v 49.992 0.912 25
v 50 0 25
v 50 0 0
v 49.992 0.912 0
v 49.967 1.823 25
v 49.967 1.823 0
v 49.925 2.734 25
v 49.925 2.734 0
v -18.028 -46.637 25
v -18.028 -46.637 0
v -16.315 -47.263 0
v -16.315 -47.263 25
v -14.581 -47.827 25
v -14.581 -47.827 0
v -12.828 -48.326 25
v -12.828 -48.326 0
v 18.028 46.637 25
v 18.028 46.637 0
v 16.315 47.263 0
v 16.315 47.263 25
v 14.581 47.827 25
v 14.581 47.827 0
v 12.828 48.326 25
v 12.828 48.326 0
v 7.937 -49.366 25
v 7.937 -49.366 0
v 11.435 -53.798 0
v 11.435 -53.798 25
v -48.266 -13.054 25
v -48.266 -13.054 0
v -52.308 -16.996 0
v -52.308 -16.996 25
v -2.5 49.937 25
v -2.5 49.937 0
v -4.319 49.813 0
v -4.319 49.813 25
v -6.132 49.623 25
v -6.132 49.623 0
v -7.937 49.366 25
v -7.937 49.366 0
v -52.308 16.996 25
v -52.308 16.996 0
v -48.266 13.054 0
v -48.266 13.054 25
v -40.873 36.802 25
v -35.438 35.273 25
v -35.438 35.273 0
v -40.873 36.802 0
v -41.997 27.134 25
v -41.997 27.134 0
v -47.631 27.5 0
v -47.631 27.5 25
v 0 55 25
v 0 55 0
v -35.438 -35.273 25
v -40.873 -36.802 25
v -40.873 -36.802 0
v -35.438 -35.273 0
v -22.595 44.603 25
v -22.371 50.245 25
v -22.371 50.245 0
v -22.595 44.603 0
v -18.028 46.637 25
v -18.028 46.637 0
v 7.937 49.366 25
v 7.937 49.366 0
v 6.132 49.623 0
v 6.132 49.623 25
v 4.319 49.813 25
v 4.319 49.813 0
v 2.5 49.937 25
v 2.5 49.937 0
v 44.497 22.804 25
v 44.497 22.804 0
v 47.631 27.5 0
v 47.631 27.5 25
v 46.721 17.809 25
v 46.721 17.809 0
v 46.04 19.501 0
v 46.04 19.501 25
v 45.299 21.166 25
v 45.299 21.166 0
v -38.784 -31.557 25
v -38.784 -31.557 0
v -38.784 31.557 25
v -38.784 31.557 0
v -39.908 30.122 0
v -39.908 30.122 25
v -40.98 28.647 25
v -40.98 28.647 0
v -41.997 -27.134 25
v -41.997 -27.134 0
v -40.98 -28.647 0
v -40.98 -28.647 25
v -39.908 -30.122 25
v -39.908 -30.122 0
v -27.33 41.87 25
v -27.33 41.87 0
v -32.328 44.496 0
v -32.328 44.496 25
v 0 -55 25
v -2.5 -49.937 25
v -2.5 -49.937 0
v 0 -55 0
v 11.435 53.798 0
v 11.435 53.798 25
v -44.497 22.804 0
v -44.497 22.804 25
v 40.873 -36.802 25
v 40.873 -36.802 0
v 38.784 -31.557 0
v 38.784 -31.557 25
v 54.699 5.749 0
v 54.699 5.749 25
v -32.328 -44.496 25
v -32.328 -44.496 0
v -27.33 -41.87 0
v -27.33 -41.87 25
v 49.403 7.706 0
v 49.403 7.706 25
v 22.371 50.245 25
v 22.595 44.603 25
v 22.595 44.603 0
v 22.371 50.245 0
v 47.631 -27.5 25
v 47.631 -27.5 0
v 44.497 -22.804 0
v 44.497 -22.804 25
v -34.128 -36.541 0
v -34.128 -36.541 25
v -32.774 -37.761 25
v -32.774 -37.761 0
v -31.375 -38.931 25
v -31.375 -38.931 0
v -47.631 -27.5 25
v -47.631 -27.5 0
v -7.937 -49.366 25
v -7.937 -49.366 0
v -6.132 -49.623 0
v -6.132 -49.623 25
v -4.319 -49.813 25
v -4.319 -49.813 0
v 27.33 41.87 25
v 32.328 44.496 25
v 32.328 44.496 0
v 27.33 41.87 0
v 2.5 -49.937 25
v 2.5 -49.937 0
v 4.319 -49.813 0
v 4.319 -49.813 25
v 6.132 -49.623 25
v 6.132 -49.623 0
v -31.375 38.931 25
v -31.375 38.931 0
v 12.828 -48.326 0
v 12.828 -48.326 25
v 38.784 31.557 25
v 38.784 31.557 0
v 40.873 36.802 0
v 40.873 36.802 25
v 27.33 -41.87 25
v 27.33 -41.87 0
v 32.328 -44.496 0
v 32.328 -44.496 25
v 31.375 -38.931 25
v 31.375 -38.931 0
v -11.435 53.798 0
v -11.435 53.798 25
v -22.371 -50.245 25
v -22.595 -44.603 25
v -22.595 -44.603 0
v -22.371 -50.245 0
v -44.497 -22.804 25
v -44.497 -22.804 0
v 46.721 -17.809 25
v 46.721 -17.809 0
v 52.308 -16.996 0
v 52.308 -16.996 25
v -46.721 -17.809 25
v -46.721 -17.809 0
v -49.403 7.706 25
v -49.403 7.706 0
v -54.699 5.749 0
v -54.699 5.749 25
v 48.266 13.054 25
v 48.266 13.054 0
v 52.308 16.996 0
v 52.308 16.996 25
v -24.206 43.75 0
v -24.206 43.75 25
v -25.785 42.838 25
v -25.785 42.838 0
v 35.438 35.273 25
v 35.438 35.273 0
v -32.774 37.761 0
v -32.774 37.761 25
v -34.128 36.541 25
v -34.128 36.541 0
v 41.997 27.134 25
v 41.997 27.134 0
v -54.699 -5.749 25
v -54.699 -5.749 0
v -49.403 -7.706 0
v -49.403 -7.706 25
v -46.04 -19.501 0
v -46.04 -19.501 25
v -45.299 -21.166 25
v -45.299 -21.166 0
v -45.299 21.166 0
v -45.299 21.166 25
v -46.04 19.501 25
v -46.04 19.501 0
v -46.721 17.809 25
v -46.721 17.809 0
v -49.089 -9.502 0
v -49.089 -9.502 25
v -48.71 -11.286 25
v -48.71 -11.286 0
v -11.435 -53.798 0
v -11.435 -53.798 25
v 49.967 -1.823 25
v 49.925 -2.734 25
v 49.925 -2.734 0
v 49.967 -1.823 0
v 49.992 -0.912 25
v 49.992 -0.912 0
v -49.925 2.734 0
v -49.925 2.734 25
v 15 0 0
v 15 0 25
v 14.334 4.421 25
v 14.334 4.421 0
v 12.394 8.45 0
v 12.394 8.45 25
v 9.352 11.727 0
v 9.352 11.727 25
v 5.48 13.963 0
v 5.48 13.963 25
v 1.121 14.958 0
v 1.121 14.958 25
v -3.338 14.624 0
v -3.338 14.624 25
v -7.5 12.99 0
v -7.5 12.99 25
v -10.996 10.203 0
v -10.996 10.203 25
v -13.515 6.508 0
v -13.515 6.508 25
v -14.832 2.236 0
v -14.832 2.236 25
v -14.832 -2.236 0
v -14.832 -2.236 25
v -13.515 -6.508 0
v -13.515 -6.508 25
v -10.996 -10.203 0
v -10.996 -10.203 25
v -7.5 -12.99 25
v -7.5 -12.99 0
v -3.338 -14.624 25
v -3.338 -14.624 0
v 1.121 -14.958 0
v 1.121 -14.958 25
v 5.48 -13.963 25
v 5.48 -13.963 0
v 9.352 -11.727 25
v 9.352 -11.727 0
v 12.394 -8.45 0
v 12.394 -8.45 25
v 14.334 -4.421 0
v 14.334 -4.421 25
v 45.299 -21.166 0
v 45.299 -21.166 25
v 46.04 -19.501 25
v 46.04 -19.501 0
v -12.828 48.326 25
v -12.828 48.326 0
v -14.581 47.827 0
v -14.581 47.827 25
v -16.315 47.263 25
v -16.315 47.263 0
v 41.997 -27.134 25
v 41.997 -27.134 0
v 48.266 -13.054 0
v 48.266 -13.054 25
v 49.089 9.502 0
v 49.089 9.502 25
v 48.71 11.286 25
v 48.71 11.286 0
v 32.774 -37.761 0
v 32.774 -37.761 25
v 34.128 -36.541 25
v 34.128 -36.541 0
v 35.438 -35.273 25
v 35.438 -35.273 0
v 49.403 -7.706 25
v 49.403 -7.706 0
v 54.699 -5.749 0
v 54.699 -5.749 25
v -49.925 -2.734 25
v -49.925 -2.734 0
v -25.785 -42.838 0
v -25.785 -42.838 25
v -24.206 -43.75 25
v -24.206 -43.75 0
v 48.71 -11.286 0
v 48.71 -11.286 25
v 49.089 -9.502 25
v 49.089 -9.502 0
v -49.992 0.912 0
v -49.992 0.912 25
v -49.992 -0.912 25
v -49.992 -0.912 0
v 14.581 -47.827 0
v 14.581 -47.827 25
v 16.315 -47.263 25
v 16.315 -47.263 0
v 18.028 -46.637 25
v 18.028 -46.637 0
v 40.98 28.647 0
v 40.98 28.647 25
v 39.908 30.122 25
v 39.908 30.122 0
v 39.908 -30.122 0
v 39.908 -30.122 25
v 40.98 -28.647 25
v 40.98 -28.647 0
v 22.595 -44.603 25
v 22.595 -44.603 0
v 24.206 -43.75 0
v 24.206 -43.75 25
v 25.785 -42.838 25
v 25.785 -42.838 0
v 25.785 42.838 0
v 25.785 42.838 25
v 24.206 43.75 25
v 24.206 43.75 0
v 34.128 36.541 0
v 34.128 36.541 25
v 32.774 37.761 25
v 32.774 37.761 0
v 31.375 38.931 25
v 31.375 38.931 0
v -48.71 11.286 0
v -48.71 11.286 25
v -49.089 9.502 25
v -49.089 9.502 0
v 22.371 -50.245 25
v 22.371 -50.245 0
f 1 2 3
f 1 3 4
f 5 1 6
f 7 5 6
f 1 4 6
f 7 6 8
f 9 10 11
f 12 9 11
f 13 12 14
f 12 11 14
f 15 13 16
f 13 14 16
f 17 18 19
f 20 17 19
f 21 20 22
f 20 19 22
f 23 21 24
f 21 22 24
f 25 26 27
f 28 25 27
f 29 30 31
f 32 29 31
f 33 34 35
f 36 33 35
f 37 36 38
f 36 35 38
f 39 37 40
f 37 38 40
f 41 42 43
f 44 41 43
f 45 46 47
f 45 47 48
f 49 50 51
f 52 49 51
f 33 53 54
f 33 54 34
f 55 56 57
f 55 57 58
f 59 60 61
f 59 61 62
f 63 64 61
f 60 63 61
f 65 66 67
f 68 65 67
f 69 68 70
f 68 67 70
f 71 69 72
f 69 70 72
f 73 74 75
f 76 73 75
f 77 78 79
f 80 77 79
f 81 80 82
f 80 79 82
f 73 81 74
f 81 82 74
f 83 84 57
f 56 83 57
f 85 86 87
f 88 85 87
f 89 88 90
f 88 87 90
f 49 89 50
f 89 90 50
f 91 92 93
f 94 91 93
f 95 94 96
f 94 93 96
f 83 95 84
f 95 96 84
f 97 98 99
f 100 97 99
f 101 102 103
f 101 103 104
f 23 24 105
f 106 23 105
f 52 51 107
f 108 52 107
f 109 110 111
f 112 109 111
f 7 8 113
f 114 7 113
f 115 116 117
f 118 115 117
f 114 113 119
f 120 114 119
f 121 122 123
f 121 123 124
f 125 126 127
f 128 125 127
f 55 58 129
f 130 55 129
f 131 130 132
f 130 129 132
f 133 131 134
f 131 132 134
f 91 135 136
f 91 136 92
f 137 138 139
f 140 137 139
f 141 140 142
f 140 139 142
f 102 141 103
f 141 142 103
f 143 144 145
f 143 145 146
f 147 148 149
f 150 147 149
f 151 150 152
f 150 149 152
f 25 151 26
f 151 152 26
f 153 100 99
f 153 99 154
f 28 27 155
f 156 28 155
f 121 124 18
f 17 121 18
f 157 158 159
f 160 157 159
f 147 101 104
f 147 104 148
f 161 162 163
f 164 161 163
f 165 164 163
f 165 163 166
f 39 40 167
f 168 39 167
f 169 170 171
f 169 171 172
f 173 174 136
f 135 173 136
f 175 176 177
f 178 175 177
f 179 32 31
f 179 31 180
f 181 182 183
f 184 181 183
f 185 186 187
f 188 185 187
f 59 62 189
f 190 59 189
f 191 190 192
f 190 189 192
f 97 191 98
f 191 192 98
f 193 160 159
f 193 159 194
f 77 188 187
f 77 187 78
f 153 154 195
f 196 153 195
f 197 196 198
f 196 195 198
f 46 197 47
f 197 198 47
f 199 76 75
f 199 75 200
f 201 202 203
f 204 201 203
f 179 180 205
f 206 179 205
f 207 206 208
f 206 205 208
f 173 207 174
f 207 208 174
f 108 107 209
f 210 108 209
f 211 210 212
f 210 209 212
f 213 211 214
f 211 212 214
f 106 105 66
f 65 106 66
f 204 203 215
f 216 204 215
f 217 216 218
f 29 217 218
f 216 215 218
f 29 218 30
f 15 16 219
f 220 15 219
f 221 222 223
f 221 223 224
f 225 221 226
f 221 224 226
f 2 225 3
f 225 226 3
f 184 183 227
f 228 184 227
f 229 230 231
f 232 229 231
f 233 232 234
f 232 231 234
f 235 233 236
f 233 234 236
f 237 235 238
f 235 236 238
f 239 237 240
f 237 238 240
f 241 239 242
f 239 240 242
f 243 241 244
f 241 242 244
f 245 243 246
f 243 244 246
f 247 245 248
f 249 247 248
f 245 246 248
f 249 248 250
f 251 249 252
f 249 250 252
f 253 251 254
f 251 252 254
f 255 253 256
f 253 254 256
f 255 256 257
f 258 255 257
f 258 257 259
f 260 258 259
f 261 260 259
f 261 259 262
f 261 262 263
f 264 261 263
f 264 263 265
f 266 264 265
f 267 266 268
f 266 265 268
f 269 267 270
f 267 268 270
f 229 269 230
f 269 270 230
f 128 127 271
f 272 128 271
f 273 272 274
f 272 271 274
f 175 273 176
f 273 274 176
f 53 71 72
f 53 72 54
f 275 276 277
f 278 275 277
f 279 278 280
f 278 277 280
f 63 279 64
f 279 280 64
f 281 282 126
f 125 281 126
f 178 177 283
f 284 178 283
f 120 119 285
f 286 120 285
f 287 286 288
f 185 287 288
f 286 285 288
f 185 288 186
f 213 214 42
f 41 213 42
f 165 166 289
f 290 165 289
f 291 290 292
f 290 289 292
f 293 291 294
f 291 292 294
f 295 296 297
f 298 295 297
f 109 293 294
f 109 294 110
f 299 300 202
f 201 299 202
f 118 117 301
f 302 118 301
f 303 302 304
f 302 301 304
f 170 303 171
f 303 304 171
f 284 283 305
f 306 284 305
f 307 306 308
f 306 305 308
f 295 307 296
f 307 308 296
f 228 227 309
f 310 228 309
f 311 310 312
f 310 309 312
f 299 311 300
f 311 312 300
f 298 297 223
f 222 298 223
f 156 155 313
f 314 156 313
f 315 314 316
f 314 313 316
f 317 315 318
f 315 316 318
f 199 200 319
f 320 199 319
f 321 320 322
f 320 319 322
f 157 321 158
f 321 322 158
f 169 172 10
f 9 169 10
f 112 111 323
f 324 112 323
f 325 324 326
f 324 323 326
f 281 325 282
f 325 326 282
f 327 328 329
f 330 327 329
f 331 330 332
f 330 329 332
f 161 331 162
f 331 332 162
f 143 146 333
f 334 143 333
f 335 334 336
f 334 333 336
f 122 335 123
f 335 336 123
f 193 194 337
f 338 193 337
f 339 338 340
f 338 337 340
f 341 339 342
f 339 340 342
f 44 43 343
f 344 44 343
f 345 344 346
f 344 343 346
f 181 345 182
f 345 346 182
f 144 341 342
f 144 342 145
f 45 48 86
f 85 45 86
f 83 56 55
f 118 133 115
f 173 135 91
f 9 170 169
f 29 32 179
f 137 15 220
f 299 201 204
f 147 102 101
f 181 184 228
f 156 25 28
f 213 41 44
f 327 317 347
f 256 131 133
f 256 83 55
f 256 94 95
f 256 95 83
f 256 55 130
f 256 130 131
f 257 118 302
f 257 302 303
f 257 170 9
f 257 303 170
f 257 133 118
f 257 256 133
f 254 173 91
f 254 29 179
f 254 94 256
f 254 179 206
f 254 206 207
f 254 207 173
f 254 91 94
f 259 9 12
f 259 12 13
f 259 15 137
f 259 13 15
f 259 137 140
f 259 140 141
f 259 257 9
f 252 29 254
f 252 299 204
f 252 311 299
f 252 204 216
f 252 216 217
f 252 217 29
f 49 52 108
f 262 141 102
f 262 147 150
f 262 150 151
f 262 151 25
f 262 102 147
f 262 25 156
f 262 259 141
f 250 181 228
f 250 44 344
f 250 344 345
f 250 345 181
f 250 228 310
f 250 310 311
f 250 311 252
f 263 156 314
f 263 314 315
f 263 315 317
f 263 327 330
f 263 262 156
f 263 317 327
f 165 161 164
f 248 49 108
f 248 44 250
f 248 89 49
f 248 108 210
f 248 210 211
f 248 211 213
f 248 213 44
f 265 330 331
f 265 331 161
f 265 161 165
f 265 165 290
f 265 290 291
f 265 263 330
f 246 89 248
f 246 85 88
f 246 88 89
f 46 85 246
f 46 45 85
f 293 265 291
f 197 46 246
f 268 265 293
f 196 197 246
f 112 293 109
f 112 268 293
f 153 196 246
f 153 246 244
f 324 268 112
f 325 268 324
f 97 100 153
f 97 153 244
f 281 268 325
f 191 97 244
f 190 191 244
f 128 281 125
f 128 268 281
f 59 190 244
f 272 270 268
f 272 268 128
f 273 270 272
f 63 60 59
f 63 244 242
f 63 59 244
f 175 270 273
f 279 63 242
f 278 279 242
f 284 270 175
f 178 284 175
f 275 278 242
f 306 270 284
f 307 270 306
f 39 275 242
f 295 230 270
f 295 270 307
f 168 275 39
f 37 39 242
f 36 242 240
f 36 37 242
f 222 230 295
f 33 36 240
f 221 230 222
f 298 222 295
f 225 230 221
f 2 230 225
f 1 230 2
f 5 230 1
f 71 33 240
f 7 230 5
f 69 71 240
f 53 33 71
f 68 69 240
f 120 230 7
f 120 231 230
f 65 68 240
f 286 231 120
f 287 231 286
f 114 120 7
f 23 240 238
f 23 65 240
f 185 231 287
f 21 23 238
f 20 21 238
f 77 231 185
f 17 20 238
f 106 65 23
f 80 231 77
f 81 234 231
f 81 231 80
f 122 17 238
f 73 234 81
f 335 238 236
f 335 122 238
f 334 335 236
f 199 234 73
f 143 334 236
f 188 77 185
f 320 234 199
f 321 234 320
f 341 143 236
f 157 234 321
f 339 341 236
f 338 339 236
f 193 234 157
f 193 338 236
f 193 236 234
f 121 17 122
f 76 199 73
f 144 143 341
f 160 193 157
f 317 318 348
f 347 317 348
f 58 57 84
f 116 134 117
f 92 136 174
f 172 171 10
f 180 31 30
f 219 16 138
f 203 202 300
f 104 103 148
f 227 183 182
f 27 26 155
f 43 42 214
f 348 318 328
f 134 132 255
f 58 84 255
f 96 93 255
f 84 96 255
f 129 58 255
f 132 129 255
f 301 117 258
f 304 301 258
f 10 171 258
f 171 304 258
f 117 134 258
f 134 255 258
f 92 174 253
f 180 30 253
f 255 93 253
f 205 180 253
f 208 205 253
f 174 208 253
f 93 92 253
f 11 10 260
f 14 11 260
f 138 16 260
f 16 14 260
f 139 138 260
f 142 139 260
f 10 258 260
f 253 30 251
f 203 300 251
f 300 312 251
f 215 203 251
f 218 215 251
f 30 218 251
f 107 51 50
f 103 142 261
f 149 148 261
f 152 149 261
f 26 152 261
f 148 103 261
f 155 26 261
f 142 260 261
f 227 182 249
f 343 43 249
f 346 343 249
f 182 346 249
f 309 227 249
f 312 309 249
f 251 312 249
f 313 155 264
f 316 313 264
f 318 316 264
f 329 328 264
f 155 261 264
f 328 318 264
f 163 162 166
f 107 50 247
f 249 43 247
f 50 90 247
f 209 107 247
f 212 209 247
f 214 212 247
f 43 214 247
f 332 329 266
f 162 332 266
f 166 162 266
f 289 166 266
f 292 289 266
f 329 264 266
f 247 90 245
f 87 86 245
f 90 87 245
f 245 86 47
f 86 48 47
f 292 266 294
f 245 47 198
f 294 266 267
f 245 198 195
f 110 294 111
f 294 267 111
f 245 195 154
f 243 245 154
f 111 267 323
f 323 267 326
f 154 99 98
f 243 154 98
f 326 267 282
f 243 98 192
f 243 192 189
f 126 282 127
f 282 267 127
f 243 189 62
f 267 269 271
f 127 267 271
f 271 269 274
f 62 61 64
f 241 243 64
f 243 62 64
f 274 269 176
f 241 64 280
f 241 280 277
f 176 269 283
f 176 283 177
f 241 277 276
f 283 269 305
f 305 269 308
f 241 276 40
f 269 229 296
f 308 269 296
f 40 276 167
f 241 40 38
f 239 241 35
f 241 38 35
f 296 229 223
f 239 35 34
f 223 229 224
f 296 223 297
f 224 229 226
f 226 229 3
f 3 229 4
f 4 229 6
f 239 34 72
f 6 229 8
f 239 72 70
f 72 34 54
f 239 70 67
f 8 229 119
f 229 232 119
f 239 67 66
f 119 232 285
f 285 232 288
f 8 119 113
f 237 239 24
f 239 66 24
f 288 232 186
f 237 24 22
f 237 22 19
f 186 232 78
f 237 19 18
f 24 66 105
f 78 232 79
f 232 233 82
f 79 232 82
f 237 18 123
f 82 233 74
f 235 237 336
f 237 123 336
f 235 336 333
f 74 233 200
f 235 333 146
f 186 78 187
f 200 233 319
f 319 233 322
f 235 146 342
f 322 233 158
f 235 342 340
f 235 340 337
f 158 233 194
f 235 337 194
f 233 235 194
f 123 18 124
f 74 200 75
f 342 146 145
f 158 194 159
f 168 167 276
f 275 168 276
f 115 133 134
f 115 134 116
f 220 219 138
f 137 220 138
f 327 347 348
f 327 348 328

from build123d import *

# Parameters (mm, degrees)
F1_DEPTH = 25
F2_R     = 15
F3_DEPTH = 25


with BuildPart() as f1:
    # F0 (on Top) → F1 (new body)
    with BuildSketch(Plane.XY):
        with BuildLine():
            ThreePointArc((49.925219, -2.733581), (49.981301, -1.367302), (50, 0))
            ThreePointArc((50, 0), (49.981301, 1.367302), (49.925219, 2.733581))
            ThreePointArc((49.925219, 2.733581), (49.726095, 5.226423), (49.402577, 7.706191))
            ThreePointArc((49.402577, 7.706191), (48.90738, 10.395585), (48.26589, 13.053883))
            ThreePointArc((48.26589, 13.053883), (47.552826, 15.45085), (46.720805, 17.809165))
            ThreePointArc((46.720805, 17.809165), (45.677273, 20.336832), (44.49711, 22.803667))
            ThreePointArc((44.49711, 22.803667), (43.30127, 25), (41.99711, 27.133794))
            ThreePointArc((41.99711, 27.133794), (40.45085, 29.389263), (38.783592, 31.556821))
            ThreePointArc((38.783592, 31.556821), (37.157241, 33.45653), (35.437939, 35.272546))
            ThreePointArc((35.437939, 35.272546), (33.45653, 37.157241), (31.375046, 38.930791))
            ThreePointArc((31.375046, 38.930791), (29.389263, 40.45085), (27.329961, 41.869718))
            ThreePointArc((27.329961, 41.869718), (25, 43.30127), (22.595259, 44.603299))
            ThreePointArc((22.595259, 44.603299), (20.336832, 45.677273), (18.027532, 46.636982))
            ThreePointArc((18.027532, 46.636982), (15.45085, 47.552826), (12.827951, 48.326428))
            ThreePointArc((12.827951, 48.326428), (10.395585, 48.90738), (7.937213, 49.365987))
            ThreePointArc((7.937213, 49.365987), (5.226423, 49.726095), (2.5, 49.937461))
            ThreePointArc((2.5, 49.937461), (0, 50), (-2.5, 49.937461))
            ThreePointArc((-2.5, 49.937461), (-5.226423, 49.726095), (-7.937213, 49.365987))
            ThreePointArc((-7.937213, 49.365987), (-10.395585, 48.90738), (-12.827951, 48.326428))
            ThreePointArc((-12.827951, 48.326428), (-15.45085, 47.552826), (-18.027532, 46.636982))
            ThreePointArc((-18.027532, 46.636982), (-20.336832, 45.677273), (-22.595259, 44.603299))
            ThreePointArc((-22.595259, 44.603299), (-25, 43.30127), (-27.329961, 41.869718))
            ThreePointArc((-27.329961, 41.869718), (-29.389263, 40.45085), (-31.375046, 38.930791))
            ThreePointArc((-31.375046, 38.930791), (-33.45653, 37.157241), (-35.437939, 35.272546))
            ThreePointArc((-35.437939, 35.272546), (-37.157241, 33.45653), (-38.783592, 31.556821))
            ThreePointArc((-38.783592, 31.556821), (-40.45085, 29.389263), (-41.99711, 27.133794))
            ThreePointArc((-41.99711, 27.133794), (-43.30127, 25), (-44.49711, 22.803667))
            ThreePointArc((-44.49711, 22.803667), (-45.677273, 20.336832), (-46.720805, 17.809165))
            ThreePointArc((-46.720805, 17.809165), (-47.552826, 15.45085), (-48.26589, 13.053883))
            ThreePointArc((-48.26589, 13.053883), (-48.90738, 10.395585), (-49.402577, 7.706191))
            ThreePointArc((-49.402577, 7.706191), (-49.726095, 5.226423), (-49.925219, 2.733581))
            ThreePointArc((-49.925219, 2.733581), (-50, 0), (-49.925219, -2.733581))
            ThreePointArc((-49.925219, -2.733581), (-49.726095, -5.226423), (-49.402577, -7.706191))
            ThreePointArc((-49.402577, -7.706191), (-48.90738, -10.395585), (-48.26589, -13.053883))
            ThreePointArc((-48.26589, -13.053883), (-47.552826, -15.45085), (-46.720805, -17.809165))
            ThreePointArc((-46.720805, -17.809165), (-45.677273, -20.336832), (-44.49711, -22.803667))
            ThreePointArc((-44.49711, -22.803667), (-43.30127, -25), (-41.99711, -27.133794))
            ThreePointArc((-41.99711, -27.133794), (-40.45085, -29.389263), (-38.783592, -31.556821))
            ThreePointArc((-38.783592, -31.556821), (-37.157241, -33.45653), (-35.437939, -35.272546))
            ThreePointArc((-35.437939, -35.272546), (-33.45653, -37.157241), (-31.375046, -38.930791))
            ThreePointArc((-31.375046, -38.930791), (-29.389263, -40.45085), (-27.329961, -41.869718))
            ThreePointArc((-27.329961, -41.869718), (-25, -43.30127), (-22.595259, -44.603299))
            ThreePointArc((-22.595259, -44.603299), (-20.336832, -45.677273), (-18.027532, -46.636982))
            ThreePointArc((-18.027532, -46.636982), (-15.45085, -47.552826), (-12.827951, -48.326428))
            ThreePointArc((-12.827951, -48.326428), (-10.395585, -48.90738), (-7.937213, -49.365987))
            ThreePointArc((-7.937213, -49.365987), (-5.226423, -49.726095), (-2.5, -49.937461))
            ThreePointArc((-2.5, -49.937461), (0, -50), (2.5, -49.937461))
            ThreePointArc((2.5, -49.937461), (5.226423, -49.726095), (7.937213, -49.365987))
            ThreePointArc((7.937213, -49.365987), (10.395585, -48.90738), (12.827951, -48.326428))
            ThreePointArc((12.827951, -48.326428), (15.45085, -47.552826), (18.027532, -46.636982))
            ThreePointArc((18.027532, -46.636982), (20.336832, -45.677273), (22.595259, -44.603299))
            ThreePointArc((22.595259, -44.603299), (25, -43.30127), (27.329961, -41.869718))
            ThreePointArc((27.329961, -41.869718), (29.389263, -40.45085), (31.375046, -38.930791))
            ThreePointArc((31.375046, -38.930791), (33.45653, -37.157241), (35.437939, -35.272546))
            ThreePointArc((35.437939, -35.272546), (37.157241, -33.45653), (38.783592, -31.556821))
            ThreePointArc((38.783592, -31.556821), (40.45085, -29.389263), (41.99711, -27.133794))
            ThreePointArc((41.99711, -27.133794), (43.30127, -25), (44.49711, -22.803667))
            ThreePointArc((44.49711, -22.803667), (45.677273, -20.336832), (46.720805, -17.809165))
            ThreePointArc((46.720805, -17.809165), (47.552826, -15.45085), (48.26589, -13.053883))
            ThreePointArc((48.26589, -13.053883), (48.90738, -10.395585), (49.402577, -7.706191))
            ThreePointArc((49.402577, -7.706191), (49.726095, -5.226423), (49.925219, -2.733581))
        make_face()
        with BuildLine():
            ThreePointArc((49.402577, 7.706191), (49.726095, 5.226423), (49.925219, 2.733581))
            Line((49.925219, 2.733581), (54.698704, 5.749065))
            Line((54.698704, 5.749065), (49.402577, 7.706191))
        make_face()
        with BuildLine():
            Line((54.698704, -5.749065), (49.925219, -2.733581))
            ThreePointArc((49.925219, -2.733581), (49.726095, -5.226423), (49.402577, -7.706191))
            Line((49.402577, -7.706191), (54.698704, -5.749065))
        make_face()
        with BuildLine():
            ThreePointArc((46.720805, 17.809165), (47.552826, 15.45085), (48.26589, 13.053883))
            Line((48.26589, 13.053883), (52.308108, 16.995935))
            Line((52.308108, 16.995935), (46.720805, 17.809165))
        make_face()
        with BuildLine():
            Line((52.308108, -16.995935), (48.26589, -13.053883))
            ThreePointArc((48.26589, -13.053883), (47.552826, -15.45085), (46.720805, -17.809165))
            Line((46.720805, -17.809165), (52.308108, -16.995935))
        make_face()
        with BuildLine():
            ThreePointArc((41.99711, 27.133794), (43.30127, 25), (44.49711, 22.803667))
            Line((44.49711, 22.803667), (47.631397, 27.5))
            Line((47.631397, 27.5), (41.99711, 27.133794))
        make_face()
        with BuildLine():
            Line((47.631397, -27.5), (44.49711, -22.803667))
            ThreePointArc((44.49711, -22.803667), (43.30127, -25), (41.99711, -27.133794))
            Line((41.99711, -27.133794), (47.631397, -27.5))
        make_face()
        with BuildLine():
            ThreePointArc((35.437939, 35.272546), (37.157241, 33.45653), (38.783592, 31.556821))
            Line((38.783592, 31.556821), (40.872965, 36.802183))
            Line((40.872965, 36.802183), (35.437939, 35.272546))
        make_face()
        with BuildLine():
            Line((40.872965, -36.802183), (38.783592, -31.556821))
            ThreePointArc((38.783592, -31.556821), (37.157241, -33.45653), (35.437939, -35.272546))
            Line((35.437939, -35.272546), (40.872965, -36.802183))
        make_face()
        with BuildLine():
            ThreePointArc((27.329961, 41.869718), (29.389263, 40.45085), (31.375046, 38.930791))
            Line((31.375046, 38.930791), (32.328189, 44.495935))
            Line((32.328189, 44.495935), (27.329961, 41.869718))
        make_face()
        with BuildLine():
            Line((32.328189, -44.495935), (31.375046, -38.930791))
            ThreePointArc((31.375046, -38.930791), (29.389263, -40.45085), (27.329961, -41.869718))
            Line((27.329961, -41.869718), (32.328189, -44.495935))
        make_face()
        with BuildLine():
            ThreePointArc((18.027532, 46.636982), (20.336832, 45.677273), (22.595259, 44.603299))
            Line((22.595259, 44.603299), (22.370515, 50.245))
            Line((22.370515, 50.245), (18.027532, 46.636982))
        make_face()
        with BuildLine():
            Line((22.370515, -50.245), (22.595259, -44.603299))
            ThreePointArc((22.595259, -44.603299), (20.336832, -45.677273), (18.027532, -46.636982))
            Line((18.027532, -46.636982), (22.370515, -50.245))
        make_face()
        with BuildLine():
            ThreePointArc((7.937213, 49.365987), (10.395585, 48.90738), (12.827951, 48.326428))
            Line((12.827951, 48.326428), (11.435143, 53.798118))
            Line((11.435143, 53.798118), (7.937213, 49.365987))
        make_face()
        with BuildLine():
            Line((11.435143, -53.798118), (12.827951, -48.326428))
            ThreePointArc((12.827951, -48.326428), (10.395585, -48.90738), (7.937213, -49.365987))
            Line((7.937213, -49.365987), (11.435143, -53.798118))
        make_face()
        with BuildLine():
            ThreePointArc((-2.5, 49.937461), (0, 50), (2.5, 49.937461))
            Line((2.5, 49.937461), (0, 55))
            Line((0, 55), (-2.5, 49.937461))
        make_face()
        with BuildLine():
            Line((0, -55), (2.5, -49.937461))
            ThreePointArc((2.5, -49.937461), (0, -50), (-2.5, -49.937461))
            Line((-2.5, -49.937461), (0, -55))
        make_face()
        with BuildLine():
            ThreePointArc((-12.827951, 48.326428), (-10.395585, 48.90738), (-7.937213, 49.365987))
            Line((-7.937213, 49.365987), (-11.435143, 53.798118))
            Line((-11.435143, 53.798118), (-12.827951, 48.326428))
        make_face()
        with BuildLine():
            Line((-11.435143, -53.798118), (-7.937213, -49.365987))
            ThreePointArc((-7.937213, -49.365987), (-10.395585, -48.90738), (-12.827951, -48.326428))
            Line((-12.827951, -48.326428), (-11.435143, -53.798118))
        make_face()
        with BuildLine():
            ThreePointArc((-22.595259, 44.603299), (-20.336832, 45.677273), (-18.027532, 46.636982))
            Line((-18.027532, 46.636982), (-22.370515, 50.245))
            Line((-22.370515, 50.245), (-22.595259, 44.603299))
        make_face()
        with BuildLine():
            Line((-22.370515, -50.245), (-18.027532, -46.636982))
            ThreePointArc((-18.027532, -46.636982), (-20.336832, -45.677273), (-22.595259, -44.603299))
            Line((-22.595259, -44.603299), (-22.370515, -50.245))
        make_face()
        with BuildLine():
            ThreePointArc((-31.375046, 38.930791), (-29.389263, 40.45085), (-27.329961, 41.869718))
            Line((-27.329961, 41.869718), (-32.328189, 44.495935))
            Line((-32.328189, 44.495935), (-31.375046, 38.930791))
        make_face()
        with BuildLine():
            Line((-32.328189, -44.495935), (-27.329961, -41.869718))
            ThreePointArc((-27.329961, -41.869718), (-29.389263, -40.45085), (-31.375046, -38.930791))
            Line((-31.375046, -38.930791), (-32.328189, -44.495935))
        make_face()
        with BuildLine():
            ThreePointArc((-38.783592, 31.556821), (-37.157241, 33.45653), (-35.437939, 35.272546))
            Line((-35.437939, 35.272546), (-40.872965, 36.802183))
            Line((-40.872965, 36.802183), (-38.783592, 31.556821))
        make_face()
        with BuildLine():
            Line((-40.872965, -36.802183), (-35.437939, -35.272546))
            ThreePointArc((-35.437939, -35.272546), (-37.157241, -33.45653), (-38.783592, -31.556821))
            Line((-38.783592, -31.556821), (-40.872965, -36.802183))
        make_face()
        with BuildLine():
            ThreePointArc((-44.49711, 22.803667), (-43.30127, 25), (-41.99711, 27.133794))
            Line((-41.99711, 27.133794), (-47.631397, 27.5))
            Line((-47.631397, 27.5), (-44.49711, 22.803667))
        make_face()
        with BuildLine():
            Line((-47.631397, -27.5), (-41.99711, -27.133794))
            ThreePointArc((-41.99711, -27.133794), (-43.30127, -25), (-44.49711, -22.803667))
            Line((-44.49711, -22.803667), (-47.631397, -27.5))
        make_face()
        with BuildLine():
            ThreePointArc((-48.26589, 13.053883), (-47.552826, 15.45085), (-46.720805, 17.809165))
            Line((-46.720805, 17.809165), (-52.308108, 16.995935))
            Line((-52.308108, 16.995935), (-48.26589, 13.053883))
        make_face()
        with BuildLine():
            Line((-52.308108, -16.995935), (-46.720805, -17.809165))
            ThreePointArc((-46.720805, -17.809165), (-47.552826, -15.45085), (-48.26589, -13.053883))
            Line((-48.26589, -13.053883), (-52.308108, -16.995935))
        make_face()
        with BuildLine():
            ThreePointArc((-49.925219, 2.733581), (-49.726095, 5.226423), (-49.402577, 7.706191))
            Line((-49.402577, 7.706191), (-54.698704, 5.749065))
            Line((-54.698704, 5.749065), (-49.925219, 2.733581))
        make_face()
        with BuildLine():
            Line((-54.698704, -5.749065), (-49.402577, -7.706191))
            ThreePointArc((-49.402577, -7.706191), (-49.726095, -5.226423), (-49.925219, -2.733581))
            Line((-49.925219, -2.733581), (-54.698704, -5.749065))
        make_face()
    extrude(amount=F1_DEPTH)

    # F2 (on face) → F3 (cut)
    with BuildSketch(Plane.XY.offset(25)):
        Circle(F2_R)
    extrude(amount=-F3_DEPTH, mode=Mode.SUBTRACT)


solid = f1.part
